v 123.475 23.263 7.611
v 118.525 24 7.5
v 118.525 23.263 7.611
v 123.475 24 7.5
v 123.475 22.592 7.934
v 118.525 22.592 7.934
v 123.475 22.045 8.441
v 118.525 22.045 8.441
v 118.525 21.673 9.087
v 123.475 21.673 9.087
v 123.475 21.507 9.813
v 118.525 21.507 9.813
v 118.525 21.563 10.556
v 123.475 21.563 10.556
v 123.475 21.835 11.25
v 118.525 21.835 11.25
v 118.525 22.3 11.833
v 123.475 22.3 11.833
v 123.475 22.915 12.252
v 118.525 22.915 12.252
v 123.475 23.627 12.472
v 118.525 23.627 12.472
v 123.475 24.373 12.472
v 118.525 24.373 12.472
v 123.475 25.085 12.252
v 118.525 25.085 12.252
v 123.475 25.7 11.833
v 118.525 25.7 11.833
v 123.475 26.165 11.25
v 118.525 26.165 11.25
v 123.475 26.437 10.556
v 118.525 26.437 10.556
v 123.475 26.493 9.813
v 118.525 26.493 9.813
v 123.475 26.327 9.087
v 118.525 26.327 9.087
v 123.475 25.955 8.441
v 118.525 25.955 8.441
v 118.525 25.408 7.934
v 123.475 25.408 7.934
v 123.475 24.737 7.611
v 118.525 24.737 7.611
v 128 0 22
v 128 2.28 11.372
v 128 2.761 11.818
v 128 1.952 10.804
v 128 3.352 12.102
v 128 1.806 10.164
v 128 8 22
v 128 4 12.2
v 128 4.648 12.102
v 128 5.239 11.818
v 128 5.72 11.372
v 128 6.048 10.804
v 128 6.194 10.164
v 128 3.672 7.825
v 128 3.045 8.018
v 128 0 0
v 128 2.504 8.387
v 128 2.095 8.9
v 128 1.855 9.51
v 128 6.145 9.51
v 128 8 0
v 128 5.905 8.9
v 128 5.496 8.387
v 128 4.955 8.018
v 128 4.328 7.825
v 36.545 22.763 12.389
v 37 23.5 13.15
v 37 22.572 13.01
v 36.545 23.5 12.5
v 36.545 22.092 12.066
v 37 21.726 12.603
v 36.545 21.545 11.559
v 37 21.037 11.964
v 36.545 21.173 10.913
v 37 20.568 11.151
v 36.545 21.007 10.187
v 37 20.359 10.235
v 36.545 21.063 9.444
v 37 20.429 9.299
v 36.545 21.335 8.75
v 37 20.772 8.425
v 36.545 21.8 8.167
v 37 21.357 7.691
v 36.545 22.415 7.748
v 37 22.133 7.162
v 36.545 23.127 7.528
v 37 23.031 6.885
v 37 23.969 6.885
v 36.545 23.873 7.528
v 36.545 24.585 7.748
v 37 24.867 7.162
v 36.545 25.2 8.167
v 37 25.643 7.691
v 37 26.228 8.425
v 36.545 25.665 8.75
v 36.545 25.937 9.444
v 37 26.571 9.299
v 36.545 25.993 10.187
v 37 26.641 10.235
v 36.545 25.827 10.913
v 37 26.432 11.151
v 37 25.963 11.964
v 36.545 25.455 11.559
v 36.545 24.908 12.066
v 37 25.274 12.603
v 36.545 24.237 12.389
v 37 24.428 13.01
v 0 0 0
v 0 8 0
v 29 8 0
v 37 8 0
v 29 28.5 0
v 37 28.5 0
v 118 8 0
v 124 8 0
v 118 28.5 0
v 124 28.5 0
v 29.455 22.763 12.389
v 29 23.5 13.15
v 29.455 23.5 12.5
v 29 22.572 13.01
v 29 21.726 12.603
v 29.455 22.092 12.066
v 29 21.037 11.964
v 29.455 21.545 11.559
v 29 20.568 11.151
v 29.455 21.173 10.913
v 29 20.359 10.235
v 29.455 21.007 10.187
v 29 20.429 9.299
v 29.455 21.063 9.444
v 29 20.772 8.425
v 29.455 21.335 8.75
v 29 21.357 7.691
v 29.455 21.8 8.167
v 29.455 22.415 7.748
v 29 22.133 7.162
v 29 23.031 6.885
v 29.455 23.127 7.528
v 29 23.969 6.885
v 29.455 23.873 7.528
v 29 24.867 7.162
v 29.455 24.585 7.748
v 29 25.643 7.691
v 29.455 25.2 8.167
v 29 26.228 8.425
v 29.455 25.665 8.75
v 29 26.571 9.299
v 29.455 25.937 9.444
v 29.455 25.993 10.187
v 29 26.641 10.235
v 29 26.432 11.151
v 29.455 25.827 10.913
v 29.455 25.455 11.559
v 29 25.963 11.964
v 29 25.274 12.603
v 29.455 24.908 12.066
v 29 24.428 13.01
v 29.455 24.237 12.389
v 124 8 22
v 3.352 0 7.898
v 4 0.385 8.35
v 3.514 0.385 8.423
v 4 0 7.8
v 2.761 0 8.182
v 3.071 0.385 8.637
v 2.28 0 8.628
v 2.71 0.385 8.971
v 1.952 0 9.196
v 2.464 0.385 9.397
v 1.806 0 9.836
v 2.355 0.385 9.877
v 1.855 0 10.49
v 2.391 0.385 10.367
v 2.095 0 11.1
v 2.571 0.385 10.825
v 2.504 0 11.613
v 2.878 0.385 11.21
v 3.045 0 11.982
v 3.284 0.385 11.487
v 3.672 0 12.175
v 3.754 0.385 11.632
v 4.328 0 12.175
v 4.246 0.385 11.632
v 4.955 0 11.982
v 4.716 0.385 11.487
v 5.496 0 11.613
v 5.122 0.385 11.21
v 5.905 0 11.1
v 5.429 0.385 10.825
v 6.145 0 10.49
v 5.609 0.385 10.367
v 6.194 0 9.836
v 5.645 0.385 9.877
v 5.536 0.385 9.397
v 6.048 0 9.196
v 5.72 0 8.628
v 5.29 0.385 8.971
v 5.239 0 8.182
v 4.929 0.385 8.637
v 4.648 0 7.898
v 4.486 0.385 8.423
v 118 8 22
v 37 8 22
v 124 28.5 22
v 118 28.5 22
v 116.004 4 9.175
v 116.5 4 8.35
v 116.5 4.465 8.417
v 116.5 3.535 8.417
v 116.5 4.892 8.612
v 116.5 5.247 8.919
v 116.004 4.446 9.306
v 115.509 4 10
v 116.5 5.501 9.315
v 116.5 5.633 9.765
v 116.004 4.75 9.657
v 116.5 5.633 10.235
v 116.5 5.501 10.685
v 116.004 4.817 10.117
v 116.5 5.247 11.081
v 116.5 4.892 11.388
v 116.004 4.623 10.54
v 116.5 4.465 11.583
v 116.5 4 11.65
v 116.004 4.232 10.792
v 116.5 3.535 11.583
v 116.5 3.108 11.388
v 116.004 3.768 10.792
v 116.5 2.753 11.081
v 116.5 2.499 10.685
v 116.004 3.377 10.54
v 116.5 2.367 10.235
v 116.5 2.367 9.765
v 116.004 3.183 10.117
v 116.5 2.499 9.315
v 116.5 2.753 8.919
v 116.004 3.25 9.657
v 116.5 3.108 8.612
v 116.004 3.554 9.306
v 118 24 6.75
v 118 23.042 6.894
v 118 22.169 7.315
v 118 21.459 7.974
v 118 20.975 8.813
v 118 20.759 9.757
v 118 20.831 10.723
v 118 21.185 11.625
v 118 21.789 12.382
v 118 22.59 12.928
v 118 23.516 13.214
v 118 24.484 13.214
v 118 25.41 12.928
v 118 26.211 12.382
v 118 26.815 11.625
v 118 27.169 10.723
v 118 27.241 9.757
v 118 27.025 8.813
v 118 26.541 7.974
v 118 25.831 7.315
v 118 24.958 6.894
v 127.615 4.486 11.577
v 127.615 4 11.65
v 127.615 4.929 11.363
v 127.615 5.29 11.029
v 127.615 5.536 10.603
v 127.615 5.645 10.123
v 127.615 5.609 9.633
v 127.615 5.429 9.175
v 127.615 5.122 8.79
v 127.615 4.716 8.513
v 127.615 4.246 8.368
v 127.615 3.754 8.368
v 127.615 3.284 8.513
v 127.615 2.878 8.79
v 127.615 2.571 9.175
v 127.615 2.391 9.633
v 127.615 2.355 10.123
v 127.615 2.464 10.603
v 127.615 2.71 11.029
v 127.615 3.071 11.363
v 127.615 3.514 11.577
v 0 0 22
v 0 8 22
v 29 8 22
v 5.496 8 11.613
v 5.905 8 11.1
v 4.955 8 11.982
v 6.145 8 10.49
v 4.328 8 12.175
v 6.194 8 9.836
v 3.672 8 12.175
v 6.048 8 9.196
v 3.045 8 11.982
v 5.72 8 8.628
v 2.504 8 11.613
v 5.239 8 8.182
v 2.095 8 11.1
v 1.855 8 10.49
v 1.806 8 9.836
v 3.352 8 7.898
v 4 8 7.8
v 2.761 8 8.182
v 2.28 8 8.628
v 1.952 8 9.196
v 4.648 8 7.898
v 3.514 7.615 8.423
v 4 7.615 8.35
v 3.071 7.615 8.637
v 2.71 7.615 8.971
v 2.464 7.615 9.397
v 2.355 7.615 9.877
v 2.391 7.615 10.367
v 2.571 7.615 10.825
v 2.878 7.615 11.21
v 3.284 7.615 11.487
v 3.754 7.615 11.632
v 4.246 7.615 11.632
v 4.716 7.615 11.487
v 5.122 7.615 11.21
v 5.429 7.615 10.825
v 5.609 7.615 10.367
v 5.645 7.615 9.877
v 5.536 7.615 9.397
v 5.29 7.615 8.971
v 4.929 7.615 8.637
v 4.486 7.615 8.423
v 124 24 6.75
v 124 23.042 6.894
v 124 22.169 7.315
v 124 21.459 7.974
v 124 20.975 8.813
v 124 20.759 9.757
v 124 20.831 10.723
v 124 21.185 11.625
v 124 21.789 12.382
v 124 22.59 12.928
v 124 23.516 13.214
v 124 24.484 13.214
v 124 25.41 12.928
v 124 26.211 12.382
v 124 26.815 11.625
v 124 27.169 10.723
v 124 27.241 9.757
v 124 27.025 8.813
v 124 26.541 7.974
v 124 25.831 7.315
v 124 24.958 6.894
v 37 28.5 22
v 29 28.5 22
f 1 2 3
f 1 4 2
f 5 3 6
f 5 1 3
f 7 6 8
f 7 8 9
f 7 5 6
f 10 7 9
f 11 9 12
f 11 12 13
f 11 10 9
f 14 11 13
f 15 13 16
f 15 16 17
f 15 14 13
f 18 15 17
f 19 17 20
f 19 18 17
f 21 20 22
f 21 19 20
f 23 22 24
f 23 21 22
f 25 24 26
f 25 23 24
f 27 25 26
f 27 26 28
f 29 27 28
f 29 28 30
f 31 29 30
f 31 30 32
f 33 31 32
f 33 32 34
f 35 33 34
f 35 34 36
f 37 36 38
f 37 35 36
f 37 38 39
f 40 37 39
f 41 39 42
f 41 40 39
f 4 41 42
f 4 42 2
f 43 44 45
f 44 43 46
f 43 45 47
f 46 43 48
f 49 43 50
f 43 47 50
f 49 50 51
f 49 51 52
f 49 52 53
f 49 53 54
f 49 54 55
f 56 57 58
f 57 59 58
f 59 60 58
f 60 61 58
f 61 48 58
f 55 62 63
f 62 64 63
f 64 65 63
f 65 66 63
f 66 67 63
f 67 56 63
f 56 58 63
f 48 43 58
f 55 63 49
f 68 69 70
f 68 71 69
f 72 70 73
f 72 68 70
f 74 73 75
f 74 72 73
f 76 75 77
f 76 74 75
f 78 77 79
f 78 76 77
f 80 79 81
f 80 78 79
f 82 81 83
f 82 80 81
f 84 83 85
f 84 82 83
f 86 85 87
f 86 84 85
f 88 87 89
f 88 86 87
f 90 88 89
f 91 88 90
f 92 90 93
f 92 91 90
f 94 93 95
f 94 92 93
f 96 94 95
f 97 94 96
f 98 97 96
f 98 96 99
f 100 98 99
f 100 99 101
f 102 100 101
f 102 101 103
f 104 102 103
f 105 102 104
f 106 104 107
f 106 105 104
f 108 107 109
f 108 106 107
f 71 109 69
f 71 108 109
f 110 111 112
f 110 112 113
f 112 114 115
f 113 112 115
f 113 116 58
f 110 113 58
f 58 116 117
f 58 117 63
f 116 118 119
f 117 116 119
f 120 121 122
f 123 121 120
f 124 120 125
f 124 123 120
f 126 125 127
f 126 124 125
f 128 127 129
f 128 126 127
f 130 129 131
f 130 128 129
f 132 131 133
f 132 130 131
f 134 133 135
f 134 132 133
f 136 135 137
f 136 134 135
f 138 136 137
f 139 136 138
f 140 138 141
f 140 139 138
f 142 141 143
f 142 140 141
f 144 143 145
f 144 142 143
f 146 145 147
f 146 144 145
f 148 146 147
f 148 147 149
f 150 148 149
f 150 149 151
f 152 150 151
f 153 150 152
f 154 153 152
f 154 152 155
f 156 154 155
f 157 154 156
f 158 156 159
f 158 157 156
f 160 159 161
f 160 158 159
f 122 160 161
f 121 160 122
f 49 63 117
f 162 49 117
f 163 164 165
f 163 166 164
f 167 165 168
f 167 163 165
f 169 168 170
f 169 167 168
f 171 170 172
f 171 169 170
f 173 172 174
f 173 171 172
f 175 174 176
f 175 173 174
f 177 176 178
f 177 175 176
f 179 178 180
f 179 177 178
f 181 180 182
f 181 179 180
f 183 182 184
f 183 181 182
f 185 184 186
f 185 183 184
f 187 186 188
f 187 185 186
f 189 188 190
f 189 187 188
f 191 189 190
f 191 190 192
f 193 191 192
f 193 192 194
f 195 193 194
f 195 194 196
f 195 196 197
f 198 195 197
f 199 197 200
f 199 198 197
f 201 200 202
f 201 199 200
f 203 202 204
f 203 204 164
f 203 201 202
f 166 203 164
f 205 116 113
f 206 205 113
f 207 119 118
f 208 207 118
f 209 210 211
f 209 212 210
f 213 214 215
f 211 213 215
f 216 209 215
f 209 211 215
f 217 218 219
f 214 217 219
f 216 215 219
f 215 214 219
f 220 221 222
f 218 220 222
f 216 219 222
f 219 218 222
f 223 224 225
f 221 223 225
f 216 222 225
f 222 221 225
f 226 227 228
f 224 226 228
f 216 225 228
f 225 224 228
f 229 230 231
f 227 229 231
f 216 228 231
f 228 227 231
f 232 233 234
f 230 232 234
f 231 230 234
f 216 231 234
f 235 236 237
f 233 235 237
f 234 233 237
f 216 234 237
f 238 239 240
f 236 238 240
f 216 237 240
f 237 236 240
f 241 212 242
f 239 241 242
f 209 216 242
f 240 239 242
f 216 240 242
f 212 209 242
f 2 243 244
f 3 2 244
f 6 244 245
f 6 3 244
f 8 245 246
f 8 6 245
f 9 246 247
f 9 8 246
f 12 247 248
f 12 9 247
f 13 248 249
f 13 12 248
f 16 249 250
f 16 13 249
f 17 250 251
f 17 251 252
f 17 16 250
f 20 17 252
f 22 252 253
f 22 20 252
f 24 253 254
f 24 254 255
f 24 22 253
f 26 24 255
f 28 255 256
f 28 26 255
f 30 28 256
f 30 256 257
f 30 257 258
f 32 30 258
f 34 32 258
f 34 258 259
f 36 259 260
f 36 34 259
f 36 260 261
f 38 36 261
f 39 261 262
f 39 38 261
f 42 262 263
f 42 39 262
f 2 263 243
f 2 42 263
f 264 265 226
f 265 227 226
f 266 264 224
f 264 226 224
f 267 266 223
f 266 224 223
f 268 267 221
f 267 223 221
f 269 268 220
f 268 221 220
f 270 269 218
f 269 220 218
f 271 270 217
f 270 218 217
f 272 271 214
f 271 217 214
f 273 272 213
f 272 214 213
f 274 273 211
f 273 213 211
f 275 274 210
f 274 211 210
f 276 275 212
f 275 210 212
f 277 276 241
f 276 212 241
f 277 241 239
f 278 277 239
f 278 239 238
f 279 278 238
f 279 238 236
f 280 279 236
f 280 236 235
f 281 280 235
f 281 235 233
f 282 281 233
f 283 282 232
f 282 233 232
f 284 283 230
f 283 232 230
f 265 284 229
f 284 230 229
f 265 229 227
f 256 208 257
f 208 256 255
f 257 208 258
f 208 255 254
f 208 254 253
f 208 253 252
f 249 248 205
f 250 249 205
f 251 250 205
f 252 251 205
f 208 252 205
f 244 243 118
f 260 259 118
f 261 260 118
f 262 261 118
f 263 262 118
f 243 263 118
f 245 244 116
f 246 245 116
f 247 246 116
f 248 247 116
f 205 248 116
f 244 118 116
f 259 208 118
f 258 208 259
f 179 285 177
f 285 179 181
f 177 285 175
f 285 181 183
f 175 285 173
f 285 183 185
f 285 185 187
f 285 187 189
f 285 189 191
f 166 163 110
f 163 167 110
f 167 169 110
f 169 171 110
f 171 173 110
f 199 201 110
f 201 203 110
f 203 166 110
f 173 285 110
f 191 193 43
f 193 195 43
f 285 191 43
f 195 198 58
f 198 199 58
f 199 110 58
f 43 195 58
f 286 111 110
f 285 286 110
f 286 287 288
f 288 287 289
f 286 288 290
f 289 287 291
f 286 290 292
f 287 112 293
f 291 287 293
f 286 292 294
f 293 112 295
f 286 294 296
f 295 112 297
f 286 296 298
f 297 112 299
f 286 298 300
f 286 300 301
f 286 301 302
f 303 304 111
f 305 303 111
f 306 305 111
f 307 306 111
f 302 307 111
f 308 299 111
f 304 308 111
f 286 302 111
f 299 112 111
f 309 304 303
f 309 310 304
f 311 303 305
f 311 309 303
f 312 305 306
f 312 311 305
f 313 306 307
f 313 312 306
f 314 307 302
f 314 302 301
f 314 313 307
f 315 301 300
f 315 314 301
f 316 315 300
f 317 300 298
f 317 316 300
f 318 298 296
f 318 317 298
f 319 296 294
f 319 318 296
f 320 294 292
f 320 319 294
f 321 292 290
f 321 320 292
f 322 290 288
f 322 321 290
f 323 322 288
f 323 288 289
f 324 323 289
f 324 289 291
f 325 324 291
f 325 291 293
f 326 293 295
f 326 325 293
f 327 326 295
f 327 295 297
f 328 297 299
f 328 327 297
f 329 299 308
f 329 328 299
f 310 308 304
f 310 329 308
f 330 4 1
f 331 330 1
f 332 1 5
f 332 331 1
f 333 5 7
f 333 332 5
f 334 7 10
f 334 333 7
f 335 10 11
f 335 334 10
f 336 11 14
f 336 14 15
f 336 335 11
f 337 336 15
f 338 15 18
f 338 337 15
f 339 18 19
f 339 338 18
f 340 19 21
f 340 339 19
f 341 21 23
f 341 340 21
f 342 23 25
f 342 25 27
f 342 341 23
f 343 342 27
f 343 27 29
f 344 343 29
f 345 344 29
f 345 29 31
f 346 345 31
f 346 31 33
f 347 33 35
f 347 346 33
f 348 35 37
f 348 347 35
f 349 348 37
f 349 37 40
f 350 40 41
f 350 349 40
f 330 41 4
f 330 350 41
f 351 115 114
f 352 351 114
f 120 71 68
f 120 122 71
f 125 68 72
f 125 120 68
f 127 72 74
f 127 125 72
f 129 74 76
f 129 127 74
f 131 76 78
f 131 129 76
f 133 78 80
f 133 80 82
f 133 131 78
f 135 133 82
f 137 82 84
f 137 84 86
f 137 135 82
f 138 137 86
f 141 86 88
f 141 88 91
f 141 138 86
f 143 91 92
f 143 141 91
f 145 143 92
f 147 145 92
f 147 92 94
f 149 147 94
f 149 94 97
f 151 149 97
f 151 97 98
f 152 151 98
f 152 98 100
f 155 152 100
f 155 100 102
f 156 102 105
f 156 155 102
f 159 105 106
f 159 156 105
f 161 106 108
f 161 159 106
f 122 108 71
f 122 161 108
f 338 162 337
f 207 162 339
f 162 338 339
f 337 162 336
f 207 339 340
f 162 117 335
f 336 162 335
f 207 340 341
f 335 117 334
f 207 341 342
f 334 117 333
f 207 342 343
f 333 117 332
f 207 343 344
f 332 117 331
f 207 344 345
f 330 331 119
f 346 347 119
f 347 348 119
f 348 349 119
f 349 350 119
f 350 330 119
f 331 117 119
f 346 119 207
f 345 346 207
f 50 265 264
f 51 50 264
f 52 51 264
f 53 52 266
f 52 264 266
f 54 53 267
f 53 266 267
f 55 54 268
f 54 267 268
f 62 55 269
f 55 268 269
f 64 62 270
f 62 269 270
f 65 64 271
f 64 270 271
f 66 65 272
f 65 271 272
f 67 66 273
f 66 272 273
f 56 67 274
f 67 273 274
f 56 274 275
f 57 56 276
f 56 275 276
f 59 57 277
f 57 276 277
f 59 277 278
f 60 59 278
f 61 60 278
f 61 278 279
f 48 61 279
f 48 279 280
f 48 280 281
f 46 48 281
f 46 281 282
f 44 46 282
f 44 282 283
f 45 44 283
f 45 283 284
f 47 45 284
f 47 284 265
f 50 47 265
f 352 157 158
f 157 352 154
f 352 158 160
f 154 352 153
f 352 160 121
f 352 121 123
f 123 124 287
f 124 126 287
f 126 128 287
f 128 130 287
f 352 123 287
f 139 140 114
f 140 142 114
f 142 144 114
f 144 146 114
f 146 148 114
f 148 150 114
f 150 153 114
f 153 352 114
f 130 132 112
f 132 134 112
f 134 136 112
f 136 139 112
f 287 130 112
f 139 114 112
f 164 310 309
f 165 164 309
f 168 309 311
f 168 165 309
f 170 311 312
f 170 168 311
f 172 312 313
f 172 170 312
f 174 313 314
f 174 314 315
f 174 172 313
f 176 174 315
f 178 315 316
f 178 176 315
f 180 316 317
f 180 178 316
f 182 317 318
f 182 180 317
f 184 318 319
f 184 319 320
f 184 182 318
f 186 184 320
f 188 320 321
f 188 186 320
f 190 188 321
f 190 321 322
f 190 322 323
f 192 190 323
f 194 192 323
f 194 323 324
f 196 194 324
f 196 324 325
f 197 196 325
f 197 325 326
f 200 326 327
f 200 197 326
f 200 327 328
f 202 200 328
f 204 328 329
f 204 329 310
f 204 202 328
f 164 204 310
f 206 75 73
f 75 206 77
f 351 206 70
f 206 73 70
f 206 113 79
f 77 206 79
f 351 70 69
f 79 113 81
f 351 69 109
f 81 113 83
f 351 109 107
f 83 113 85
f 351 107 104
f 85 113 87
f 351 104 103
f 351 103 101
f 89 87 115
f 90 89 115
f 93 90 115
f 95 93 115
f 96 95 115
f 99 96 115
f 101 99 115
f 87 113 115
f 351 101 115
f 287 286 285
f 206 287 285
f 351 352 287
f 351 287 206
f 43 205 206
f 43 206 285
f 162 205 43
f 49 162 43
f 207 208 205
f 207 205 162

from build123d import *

# Parameters (mm, degrees)
EXTRUDE_1_DEPTH     = 22
M4X0_72_D           = 3.3
M4X0_72_DEPTH       = 11.5
M4X0_72_CSINK_D     = 4.4
M4X0_72_CSINK_ANGLE = 110
M4X0_72_TIP         = 0.991420021


with BuildPart() as part:
    # Эскиз1 → Бобышка-Вытянуть1 (new body)
    with BuildSketch(Plane.XY):
        Polygon((0, 0), (128, 0), (128, 8), (124, 8), (124, 28.5), (118, 28.5), (118, 8), (37, 8), (37, 28.5), (29, 28.5), (29, 8), (0, 8), align=None)
    extrude(amount=EXTRUDE_1_DEPTH)

    # Эскиз2 → Отверстие обработанное метчиком M6x1.01 (revolve, cut)
    with BuildSketch(Plane(origin=(29, 23.5, 10), x_dir=(0, 0, 1), z_dir=(0, 1, 0))):
        Polygon((0, 0), (0, 8), (3.15, 8), (2.5, 7.5448651), (2.5, 0.4551349), (3.15, 0), align=None)
    revolve(axis=Axis((22.65, 23.5, 10), (1, 0, 0)), mode=Mode.SUBTRACT)

    # Эскиз4 → Отверстие обработанное метчиком M6x1.02 (revolve, cut)
    with BuildSketch(Plane(origin=(124, 24, 10), x_dir=(0, 0, -1), z_dir=(0, 1, 0))):
        Polygon((0, 0), (0, 6), (3.25, 6), (2.5, 5.474844346), (2.5, 0.525155654), (3.25, 0), align=None)
    revolve(axis=Axis((130.35, 24, 10), (-1, 0, 0)), mode=Mode.SUBTRACT)

    # Эскиз6 → Отверстие обработанное метчиком M4x0.71 (revolve, cut)
    with BuildSketch(Plane(origin=(4, 0, 10), x_dir=(0, 0, -1), z_dir=(1, 0, 0))):
        Polygon((0, 0), (0, 8), (2.2, 8), (1.65, 7.614885854), (1.65, 0.385114146), (2.2, 0), align=None)
    revolve(axis=Axis((4, -6.35, 10), (0, 1, 0)), mode=Mode.SUBTRACT)

    # Отверстие обработанное метчиком M4x0.72
    with Locations(Plane(origin=(128, 0, 0), x_dir=(0, 0, -1), z_dir=(1, 0, 0))):
        with Locations((-10, 4)):
            CounterSinkHole(M4X0_72_D / 2, M4X0_72_CSINK_D / 2, depth=M4X0_72_DEPTH, counter_sink_angle=M4X0_72_CSINK_ANGLE)
            with Locations((0, 0, -(M4X0_72_DEPTH + M4X0_72_TIP / 2))):  # 118° drill point
                Cone(0, M4X0_72_D / 2, M4X0_72_TIP, mode=Mode.SUBTRACT)


solid = part.part
